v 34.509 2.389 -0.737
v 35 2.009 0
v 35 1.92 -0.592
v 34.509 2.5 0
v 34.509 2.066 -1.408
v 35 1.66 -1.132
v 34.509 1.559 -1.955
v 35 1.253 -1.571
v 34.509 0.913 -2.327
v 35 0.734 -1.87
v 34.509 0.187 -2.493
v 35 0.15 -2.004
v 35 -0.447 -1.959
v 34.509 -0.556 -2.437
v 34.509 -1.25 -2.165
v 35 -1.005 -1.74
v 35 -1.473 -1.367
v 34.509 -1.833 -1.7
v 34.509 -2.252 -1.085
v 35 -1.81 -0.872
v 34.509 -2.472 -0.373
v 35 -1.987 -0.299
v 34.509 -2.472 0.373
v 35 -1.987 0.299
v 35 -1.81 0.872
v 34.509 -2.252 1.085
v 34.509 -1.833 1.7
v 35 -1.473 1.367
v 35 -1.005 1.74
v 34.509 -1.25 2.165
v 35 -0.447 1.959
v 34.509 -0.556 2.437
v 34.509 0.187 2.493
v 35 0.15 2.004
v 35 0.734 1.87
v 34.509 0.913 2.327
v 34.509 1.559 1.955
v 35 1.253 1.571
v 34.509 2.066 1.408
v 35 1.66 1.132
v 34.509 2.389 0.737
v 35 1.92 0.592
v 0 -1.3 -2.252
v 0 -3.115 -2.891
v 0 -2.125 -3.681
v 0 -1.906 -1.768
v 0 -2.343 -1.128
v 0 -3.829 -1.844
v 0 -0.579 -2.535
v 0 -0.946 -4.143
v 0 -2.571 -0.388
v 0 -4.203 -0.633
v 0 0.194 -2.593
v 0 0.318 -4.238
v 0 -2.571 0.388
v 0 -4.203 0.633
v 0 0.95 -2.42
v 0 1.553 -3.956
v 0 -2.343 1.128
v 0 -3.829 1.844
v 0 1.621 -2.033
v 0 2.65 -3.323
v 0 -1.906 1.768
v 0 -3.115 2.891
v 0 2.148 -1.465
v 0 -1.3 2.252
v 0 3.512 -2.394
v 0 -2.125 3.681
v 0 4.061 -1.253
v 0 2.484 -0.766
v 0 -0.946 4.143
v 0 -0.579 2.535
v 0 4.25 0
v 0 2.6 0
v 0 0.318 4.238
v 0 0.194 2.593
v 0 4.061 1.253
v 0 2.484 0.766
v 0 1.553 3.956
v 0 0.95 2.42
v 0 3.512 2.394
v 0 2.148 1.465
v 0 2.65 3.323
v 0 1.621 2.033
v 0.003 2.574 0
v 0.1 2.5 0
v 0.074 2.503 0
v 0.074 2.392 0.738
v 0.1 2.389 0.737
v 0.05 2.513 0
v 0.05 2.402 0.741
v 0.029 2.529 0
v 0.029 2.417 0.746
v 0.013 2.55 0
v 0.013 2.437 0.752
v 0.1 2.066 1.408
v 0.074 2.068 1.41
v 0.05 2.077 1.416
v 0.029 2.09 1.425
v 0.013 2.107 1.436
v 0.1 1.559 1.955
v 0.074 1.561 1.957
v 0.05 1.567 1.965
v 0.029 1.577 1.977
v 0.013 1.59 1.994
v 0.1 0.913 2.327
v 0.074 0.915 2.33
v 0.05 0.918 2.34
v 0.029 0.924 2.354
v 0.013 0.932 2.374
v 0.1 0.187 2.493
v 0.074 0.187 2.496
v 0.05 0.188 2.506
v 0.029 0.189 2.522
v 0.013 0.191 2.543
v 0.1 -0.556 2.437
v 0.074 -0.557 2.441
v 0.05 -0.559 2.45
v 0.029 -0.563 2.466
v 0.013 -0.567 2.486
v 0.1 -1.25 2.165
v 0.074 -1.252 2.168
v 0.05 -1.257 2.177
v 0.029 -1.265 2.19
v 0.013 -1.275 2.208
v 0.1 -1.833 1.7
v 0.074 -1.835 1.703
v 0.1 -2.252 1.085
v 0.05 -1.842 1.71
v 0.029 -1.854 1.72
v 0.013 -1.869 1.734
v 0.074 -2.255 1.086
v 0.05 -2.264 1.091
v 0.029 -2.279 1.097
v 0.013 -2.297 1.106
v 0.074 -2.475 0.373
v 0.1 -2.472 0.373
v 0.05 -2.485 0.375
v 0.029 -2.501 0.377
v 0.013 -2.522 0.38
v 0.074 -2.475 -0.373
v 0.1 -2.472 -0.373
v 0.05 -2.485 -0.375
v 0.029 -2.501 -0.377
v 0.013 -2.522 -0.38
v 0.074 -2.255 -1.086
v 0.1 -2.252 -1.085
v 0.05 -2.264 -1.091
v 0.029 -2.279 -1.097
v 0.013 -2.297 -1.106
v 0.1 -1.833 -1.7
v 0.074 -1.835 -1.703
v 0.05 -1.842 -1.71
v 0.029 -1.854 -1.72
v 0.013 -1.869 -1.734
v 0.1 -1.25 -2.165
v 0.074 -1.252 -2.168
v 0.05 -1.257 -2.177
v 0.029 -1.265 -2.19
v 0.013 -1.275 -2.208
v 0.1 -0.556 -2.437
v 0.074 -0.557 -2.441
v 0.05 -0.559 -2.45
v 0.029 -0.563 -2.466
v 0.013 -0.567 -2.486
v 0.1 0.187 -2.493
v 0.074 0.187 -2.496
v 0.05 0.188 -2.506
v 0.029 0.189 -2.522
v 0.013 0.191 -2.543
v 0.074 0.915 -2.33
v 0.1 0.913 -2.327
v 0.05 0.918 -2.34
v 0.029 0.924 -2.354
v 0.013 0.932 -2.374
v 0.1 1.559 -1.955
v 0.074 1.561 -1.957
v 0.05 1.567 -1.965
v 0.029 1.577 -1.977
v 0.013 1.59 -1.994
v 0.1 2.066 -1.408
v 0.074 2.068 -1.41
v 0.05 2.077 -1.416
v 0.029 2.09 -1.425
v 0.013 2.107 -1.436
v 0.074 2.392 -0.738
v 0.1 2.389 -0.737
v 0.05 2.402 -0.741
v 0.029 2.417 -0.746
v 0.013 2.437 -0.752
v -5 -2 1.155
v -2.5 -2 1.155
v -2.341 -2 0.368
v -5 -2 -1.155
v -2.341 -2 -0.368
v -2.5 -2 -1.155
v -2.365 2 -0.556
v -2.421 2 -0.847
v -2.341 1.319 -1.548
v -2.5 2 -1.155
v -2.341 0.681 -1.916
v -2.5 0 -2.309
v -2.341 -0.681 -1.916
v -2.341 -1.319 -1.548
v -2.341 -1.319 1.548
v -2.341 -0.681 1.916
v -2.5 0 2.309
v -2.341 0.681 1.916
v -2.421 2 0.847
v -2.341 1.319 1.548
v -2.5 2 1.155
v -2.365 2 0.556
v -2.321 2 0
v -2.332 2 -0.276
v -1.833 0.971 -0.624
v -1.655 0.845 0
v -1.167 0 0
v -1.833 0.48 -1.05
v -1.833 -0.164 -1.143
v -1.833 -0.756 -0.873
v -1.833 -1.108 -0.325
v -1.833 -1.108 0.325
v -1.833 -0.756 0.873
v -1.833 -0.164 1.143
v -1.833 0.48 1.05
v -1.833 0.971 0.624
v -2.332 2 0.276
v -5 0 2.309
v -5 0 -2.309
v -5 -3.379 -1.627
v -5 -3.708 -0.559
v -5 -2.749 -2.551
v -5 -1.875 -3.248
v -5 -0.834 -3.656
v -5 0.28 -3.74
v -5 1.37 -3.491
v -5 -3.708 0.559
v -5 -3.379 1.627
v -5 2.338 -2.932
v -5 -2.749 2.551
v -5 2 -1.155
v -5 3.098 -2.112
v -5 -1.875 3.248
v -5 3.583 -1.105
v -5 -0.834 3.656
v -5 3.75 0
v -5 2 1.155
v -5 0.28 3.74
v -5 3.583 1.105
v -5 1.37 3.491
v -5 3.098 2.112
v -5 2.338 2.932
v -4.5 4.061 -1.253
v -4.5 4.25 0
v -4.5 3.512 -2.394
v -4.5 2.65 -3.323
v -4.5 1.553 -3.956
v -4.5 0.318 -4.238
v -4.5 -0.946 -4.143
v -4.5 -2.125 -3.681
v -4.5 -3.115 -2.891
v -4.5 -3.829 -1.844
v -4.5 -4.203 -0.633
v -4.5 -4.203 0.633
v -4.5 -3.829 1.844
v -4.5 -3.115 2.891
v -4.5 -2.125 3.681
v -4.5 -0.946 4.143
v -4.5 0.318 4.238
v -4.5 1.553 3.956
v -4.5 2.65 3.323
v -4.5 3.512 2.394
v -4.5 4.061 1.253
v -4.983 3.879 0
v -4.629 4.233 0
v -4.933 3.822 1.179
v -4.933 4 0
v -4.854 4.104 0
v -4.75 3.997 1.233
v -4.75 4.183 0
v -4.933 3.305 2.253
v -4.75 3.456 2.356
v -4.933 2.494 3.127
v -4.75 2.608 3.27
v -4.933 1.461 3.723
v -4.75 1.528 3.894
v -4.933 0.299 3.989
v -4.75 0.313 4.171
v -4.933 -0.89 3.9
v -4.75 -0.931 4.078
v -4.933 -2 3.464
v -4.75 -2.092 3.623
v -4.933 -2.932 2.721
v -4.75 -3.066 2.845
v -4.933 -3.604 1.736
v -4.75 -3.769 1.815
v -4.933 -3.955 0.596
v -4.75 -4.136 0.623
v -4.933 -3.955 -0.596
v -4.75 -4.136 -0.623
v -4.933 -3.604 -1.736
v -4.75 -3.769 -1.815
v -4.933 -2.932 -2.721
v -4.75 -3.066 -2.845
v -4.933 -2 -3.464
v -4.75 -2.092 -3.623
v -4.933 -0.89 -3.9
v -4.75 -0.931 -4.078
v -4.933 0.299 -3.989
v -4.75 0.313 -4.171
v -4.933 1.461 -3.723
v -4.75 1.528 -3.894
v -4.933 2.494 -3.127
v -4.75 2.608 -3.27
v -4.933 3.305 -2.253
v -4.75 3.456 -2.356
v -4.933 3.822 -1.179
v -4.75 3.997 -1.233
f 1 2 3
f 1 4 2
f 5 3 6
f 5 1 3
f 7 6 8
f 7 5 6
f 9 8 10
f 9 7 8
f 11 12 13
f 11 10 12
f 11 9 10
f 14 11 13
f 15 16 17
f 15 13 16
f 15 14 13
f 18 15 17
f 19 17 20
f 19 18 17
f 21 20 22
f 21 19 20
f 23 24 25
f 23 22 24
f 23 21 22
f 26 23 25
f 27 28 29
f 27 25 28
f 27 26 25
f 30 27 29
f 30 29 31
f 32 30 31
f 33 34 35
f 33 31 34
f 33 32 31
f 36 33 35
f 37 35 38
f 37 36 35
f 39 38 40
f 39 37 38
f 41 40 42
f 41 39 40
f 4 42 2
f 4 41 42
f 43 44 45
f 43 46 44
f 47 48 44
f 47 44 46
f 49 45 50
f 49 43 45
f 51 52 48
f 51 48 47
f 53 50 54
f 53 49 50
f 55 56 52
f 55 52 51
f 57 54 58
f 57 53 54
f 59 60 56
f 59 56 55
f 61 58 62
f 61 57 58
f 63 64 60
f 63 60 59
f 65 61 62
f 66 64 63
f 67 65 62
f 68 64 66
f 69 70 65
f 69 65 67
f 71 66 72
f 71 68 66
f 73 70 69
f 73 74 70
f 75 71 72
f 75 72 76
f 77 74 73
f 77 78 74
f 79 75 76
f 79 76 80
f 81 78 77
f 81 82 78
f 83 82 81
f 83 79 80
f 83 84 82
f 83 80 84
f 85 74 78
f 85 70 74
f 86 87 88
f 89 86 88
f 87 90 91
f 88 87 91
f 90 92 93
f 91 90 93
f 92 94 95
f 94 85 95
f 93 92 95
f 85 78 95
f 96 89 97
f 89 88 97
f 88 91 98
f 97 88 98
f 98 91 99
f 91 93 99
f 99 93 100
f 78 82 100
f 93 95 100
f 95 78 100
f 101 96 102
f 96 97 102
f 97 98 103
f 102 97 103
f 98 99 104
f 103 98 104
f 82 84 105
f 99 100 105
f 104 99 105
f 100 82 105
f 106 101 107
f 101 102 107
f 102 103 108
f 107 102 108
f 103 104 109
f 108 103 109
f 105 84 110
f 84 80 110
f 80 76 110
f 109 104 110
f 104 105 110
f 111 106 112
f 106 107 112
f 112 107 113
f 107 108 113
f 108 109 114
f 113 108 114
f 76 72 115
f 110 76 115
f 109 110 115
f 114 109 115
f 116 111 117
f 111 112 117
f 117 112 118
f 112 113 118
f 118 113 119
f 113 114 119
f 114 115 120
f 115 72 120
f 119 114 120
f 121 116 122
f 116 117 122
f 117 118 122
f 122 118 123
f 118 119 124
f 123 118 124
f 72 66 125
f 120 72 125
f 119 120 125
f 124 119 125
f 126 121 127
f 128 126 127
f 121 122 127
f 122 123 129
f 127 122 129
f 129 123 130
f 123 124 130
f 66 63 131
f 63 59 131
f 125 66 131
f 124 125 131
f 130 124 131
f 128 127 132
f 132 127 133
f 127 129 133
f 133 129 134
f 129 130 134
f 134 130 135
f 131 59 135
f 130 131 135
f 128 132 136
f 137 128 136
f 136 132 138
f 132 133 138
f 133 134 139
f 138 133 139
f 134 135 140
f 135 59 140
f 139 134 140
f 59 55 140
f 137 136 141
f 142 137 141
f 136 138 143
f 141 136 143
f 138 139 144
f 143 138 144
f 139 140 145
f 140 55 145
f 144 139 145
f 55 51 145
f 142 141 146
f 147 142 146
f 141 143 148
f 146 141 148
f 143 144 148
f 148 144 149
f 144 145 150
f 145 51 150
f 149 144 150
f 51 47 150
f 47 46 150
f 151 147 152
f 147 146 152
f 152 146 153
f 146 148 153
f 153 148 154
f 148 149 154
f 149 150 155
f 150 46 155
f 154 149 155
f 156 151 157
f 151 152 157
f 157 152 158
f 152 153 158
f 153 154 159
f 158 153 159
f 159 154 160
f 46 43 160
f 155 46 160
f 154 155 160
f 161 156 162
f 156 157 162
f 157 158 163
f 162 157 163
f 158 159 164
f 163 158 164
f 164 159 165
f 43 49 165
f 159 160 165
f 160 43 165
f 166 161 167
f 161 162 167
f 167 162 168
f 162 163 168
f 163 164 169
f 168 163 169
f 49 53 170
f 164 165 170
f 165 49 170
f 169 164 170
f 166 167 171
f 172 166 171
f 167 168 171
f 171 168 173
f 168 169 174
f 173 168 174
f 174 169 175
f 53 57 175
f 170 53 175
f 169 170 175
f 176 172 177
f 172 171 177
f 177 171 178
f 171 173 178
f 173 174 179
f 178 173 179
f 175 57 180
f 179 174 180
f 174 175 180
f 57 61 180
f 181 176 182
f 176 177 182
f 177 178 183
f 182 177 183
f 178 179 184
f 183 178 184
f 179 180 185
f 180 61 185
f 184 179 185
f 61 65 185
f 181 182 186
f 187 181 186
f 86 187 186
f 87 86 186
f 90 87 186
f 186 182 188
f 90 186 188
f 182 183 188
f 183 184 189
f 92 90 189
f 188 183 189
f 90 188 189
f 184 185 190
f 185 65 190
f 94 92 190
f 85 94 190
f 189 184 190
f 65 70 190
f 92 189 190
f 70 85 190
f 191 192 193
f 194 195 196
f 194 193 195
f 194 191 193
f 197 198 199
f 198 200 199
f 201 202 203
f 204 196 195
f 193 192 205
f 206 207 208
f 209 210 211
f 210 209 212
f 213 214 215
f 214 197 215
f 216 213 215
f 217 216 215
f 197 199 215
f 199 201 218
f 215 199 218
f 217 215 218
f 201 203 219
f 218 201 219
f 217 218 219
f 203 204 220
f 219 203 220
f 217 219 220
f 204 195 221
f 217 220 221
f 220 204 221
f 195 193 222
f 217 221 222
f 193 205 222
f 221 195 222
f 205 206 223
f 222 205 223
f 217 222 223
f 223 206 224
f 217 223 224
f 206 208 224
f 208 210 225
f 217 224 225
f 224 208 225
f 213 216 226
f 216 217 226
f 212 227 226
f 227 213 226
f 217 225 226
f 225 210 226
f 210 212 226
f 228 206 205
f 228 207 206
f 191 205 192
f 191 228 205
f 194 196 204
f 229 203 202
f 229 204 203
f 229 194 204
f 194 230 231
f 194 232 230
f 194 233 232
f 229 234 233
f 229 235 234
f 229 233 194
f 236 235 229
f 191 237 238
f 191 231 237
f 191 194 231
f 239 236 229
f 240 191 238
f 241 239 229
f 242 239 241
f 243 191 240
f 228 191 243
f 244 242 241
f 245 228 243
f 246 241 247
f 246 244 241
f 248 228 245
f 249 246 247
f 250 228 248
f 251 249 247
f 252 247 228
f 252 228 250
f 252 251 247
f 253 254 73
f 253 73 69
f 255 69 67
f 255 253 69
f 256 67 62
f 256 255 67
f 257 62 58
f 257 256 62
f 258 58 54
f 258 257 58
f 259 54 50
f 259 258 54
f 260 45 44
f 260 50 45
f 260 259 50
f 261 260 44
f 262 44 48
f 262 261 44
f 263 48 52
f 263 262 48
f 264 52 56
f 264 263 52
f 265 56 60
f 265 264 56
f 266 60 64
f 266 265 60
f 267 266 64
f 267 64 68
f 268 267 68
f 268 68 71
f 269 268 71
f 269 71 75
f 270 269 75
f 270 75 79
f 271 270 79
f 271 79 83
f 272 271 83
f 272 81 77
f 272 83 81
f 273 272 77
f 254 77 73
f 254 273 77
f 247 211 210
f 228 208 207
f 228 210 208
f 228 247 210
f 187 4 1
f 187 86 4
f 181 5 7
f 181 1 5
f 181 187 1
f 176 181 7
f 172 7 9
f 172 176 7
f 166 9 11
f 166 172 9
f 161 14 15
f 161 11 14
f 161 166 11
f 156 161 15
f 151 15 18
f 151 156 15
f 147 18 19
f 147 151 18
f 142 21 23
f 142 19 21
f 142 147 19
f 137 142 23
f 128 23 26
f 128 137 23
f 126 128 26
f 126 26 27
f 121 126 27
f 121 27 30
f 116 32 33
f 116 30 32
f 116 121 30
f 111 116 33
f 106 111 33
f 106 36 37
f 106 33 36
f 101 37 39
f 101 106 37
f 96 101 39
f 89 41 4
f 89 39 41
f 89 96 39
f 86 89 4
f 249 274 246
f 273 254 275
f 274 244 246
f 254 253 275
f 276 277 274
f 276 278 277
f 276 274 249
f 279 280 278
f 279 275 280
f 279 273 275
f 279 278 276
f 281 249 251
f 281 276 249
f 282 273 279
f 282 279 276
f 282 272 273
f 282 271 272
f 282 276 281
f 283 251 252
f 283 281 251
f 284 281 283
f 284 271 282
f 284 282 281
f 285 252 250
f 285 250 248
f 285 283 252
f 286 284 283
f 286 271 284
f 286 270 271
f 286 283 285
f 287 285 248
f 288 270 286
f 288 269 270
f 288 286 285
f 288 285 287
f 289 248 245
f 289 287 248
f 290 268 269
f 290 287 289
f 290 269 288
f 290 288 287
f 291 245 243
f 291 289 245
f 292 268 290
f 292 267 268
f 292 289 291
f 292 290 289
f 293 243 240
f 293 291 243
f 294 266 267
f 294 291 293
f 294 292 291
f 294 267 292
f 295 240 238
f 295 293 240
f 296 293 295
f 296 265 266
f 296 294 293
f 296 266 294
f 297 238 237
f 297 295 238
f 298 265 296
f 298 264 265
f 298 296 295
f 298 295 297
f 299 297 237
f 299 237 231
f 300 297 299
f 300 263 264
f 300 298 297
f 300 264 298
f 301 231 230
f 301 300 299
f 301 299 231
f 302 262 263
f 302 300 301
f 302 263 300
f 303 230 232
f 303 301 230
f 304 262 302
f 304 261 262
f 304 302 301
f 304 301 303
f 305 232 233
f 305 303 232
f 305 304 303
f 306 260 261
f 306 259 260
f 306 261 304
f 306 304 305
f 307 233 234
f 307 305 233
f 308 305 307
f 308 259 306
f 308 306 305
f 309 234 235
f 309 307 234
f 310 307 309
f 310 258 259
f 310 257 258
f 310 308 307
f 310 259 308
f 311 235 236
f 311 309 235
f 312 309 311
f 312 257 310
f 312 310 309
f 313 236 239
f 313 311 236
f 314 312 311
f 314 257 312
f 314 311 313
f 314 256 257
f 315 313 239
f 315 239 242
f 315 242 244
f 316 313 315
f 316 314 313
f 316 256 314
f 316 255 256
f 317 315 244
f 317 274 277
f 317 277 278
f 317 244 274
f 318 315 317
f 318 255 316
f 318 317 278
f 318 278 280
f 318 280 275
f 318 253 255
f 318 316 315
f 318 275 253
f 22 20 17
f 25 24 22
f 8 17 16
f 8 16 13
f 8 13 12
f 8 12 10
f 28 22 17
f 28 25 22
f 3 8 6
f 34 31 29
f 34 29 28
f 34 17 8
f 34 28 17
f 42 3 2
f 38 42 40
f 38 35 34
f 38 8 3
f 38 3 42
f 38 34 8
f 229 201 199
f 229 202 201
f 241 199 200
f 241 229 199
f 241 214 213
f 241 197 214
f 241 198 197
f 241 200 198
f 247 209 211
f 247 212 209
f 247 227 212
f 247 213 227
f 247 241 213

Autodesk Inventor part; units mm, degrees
ref_plane "YZ Plane" through (0, 0, 0) normal (1, 0, 0) x (0, 1, 0)
ref_plane "XZ Plane" through (0, 0, 0) normal (0, 1, 0) x (-1, 0, 0)
sketch "Sketch1" plane through (0, 0, 0) normal (0, 0, 1) x (1, 0, 0)
  line L0 (-1.1667, 0) -> (35, 0)
  line L1 (35, 0) -> (35, 2.5)
  line L2 (35, 2.5) -> (19, 2.5)
  line L3 (19, 2.5) -> (18.5091, 2.5)
  line L4 (18.5091, 2.5) -> (0, 2.5)
  line L5 (0, 2.5) -> (0, 4.25)
  line L6 (0, 4.25) -> (-5, 4.25)
  line L7 (-5, 4.25) -> (-5, 2.3094)
  line L8 (-5, 2.3094) -> (-2.5, 2.3094)
  line L9 (-2.5, 2.3094) -> (-1.1667, 0)
  line L10 (-13, 0) -> (43, 0) projected
  line L11 (0, -0.85) -> (0, 5.1) projected
  line L12 (19, 2.5) -> (0, 2.5) construction
  dimension "d1" = 16
  dimension "d2" = 0.4909
  dimension "d3" = 5
  dimension "d4" = 2.5
  dimension "d5" = 60
  dimension "d6" = 5
  dimension "d7" = 5
  dimension "d8" = 4.6188
  dimension "d9" = 8.5
  dimension "d26" = 35
revolve "Body" add sketch "Sketch1" angle 360 about axis through (-1.1667, 0, 0) along (1, 0, 0)
sketch "Sketch2" plane through (-5, 0, 0) normal (-1, 0, 0) x (0, 0, 1)
  circle A0 centre (0, 0) radius 2.3094 projected
  line L0 (0, -5.95) -> (0, 5.95) projected
  line L1 (-5.95, 0) -> (5.95, 0) projected
  line L2 (2.3094, 0) -> (1.1547, -2)
  line L3 (1.1547, -2) -> (-1.1547, -2)
  line L4 (-1.1547, -2) -> (-2.3094, 0)
  line L5 (-2.3094, 0) -> (-1.1547, 2)
  line L6 (-1.1547, 2) -> (1.1547, 2)
  line L7 (1.1547, 2) -> (2.3094, 0)
extrude "Slot" add sketch "Sketch2" against normal up to next contours L7 A0 | A0 L2 | L6 L0 A0 | A0 L0 L3 | L0 L6 A0 | A0 L3 L0 | L4 A0 | A0 L5
fillet "Fillet1" radius 0.5 1 edges at (-5, -4.25, 0)
thread "Thread" size "M5x0.8" class "6g" standard "ISO Metric profile" length 16
chamfer "Chamfer1" distance 0.4908 distance2 0.4908 1 edges at (35, -2.5, 0) measured on face at (35, -0.7192, 0.1653)
ref_plane "Work Plane1" through (29, 0, 0) normal (0, -1, 0) x (1, 0, 0)
fillet "Fillet2" radius 0.1 1 edges at (0, -2.5, 0)
equation "\"d1\" = GEL"
equation "\"d3\" = KOH"
equation "\"d4\" = INTI"
equation "\"d6\" = GD"
equation "\"d7\" = BDM"
equation "\"d8\" = 1.1547 * SW"
equation "\"d9\" = KOD"
equation "\"d17\" = RR"
equation "\"d13\" = GEL"
equation "\"d15\" = -0.5 * SPD + 0.5 * GD"
equation "\"d16\" = GUL"
equation "\"d30\" = R"
equation "\"GD\" = NND"
equation "\"GEL\" = 16"
equation "\"KOD\" = 8.5"
equation "\"KOH\" = NND"
equation "\"INTI\" = 2.5"
equation "\"GAL\" = 0.61345 * PTC"
equation "\"GUL\" = 0.61345 * PTC"
equation "\"BDM\" = NND"
equation "\"SW\" = 4"
equation "\"RR\" = 0.1 * NND"
equation "\"SPD\" = NND - 1.2269 * PTC"
equation "\"R\" = 0.1"
equation "\"PHH\" = 0.13"
equation "\"GD1\" = THREADDIA - 1.2269 * PTC"
equation "\"THREADDIA\" = 5"
equation "\"FAWI\" = 45deg"
equation "\"PTC\" = 0.8"
equation "\"KOH1\" = 4.5"
equation "\"NND\" = 5"
equation "\"TOA\" = 30deg"
equation "\"E0\" = 1.155 * SW"
properties part number "AS 1420 - 1973 - M5 x 20" material "Steel, Mild"
